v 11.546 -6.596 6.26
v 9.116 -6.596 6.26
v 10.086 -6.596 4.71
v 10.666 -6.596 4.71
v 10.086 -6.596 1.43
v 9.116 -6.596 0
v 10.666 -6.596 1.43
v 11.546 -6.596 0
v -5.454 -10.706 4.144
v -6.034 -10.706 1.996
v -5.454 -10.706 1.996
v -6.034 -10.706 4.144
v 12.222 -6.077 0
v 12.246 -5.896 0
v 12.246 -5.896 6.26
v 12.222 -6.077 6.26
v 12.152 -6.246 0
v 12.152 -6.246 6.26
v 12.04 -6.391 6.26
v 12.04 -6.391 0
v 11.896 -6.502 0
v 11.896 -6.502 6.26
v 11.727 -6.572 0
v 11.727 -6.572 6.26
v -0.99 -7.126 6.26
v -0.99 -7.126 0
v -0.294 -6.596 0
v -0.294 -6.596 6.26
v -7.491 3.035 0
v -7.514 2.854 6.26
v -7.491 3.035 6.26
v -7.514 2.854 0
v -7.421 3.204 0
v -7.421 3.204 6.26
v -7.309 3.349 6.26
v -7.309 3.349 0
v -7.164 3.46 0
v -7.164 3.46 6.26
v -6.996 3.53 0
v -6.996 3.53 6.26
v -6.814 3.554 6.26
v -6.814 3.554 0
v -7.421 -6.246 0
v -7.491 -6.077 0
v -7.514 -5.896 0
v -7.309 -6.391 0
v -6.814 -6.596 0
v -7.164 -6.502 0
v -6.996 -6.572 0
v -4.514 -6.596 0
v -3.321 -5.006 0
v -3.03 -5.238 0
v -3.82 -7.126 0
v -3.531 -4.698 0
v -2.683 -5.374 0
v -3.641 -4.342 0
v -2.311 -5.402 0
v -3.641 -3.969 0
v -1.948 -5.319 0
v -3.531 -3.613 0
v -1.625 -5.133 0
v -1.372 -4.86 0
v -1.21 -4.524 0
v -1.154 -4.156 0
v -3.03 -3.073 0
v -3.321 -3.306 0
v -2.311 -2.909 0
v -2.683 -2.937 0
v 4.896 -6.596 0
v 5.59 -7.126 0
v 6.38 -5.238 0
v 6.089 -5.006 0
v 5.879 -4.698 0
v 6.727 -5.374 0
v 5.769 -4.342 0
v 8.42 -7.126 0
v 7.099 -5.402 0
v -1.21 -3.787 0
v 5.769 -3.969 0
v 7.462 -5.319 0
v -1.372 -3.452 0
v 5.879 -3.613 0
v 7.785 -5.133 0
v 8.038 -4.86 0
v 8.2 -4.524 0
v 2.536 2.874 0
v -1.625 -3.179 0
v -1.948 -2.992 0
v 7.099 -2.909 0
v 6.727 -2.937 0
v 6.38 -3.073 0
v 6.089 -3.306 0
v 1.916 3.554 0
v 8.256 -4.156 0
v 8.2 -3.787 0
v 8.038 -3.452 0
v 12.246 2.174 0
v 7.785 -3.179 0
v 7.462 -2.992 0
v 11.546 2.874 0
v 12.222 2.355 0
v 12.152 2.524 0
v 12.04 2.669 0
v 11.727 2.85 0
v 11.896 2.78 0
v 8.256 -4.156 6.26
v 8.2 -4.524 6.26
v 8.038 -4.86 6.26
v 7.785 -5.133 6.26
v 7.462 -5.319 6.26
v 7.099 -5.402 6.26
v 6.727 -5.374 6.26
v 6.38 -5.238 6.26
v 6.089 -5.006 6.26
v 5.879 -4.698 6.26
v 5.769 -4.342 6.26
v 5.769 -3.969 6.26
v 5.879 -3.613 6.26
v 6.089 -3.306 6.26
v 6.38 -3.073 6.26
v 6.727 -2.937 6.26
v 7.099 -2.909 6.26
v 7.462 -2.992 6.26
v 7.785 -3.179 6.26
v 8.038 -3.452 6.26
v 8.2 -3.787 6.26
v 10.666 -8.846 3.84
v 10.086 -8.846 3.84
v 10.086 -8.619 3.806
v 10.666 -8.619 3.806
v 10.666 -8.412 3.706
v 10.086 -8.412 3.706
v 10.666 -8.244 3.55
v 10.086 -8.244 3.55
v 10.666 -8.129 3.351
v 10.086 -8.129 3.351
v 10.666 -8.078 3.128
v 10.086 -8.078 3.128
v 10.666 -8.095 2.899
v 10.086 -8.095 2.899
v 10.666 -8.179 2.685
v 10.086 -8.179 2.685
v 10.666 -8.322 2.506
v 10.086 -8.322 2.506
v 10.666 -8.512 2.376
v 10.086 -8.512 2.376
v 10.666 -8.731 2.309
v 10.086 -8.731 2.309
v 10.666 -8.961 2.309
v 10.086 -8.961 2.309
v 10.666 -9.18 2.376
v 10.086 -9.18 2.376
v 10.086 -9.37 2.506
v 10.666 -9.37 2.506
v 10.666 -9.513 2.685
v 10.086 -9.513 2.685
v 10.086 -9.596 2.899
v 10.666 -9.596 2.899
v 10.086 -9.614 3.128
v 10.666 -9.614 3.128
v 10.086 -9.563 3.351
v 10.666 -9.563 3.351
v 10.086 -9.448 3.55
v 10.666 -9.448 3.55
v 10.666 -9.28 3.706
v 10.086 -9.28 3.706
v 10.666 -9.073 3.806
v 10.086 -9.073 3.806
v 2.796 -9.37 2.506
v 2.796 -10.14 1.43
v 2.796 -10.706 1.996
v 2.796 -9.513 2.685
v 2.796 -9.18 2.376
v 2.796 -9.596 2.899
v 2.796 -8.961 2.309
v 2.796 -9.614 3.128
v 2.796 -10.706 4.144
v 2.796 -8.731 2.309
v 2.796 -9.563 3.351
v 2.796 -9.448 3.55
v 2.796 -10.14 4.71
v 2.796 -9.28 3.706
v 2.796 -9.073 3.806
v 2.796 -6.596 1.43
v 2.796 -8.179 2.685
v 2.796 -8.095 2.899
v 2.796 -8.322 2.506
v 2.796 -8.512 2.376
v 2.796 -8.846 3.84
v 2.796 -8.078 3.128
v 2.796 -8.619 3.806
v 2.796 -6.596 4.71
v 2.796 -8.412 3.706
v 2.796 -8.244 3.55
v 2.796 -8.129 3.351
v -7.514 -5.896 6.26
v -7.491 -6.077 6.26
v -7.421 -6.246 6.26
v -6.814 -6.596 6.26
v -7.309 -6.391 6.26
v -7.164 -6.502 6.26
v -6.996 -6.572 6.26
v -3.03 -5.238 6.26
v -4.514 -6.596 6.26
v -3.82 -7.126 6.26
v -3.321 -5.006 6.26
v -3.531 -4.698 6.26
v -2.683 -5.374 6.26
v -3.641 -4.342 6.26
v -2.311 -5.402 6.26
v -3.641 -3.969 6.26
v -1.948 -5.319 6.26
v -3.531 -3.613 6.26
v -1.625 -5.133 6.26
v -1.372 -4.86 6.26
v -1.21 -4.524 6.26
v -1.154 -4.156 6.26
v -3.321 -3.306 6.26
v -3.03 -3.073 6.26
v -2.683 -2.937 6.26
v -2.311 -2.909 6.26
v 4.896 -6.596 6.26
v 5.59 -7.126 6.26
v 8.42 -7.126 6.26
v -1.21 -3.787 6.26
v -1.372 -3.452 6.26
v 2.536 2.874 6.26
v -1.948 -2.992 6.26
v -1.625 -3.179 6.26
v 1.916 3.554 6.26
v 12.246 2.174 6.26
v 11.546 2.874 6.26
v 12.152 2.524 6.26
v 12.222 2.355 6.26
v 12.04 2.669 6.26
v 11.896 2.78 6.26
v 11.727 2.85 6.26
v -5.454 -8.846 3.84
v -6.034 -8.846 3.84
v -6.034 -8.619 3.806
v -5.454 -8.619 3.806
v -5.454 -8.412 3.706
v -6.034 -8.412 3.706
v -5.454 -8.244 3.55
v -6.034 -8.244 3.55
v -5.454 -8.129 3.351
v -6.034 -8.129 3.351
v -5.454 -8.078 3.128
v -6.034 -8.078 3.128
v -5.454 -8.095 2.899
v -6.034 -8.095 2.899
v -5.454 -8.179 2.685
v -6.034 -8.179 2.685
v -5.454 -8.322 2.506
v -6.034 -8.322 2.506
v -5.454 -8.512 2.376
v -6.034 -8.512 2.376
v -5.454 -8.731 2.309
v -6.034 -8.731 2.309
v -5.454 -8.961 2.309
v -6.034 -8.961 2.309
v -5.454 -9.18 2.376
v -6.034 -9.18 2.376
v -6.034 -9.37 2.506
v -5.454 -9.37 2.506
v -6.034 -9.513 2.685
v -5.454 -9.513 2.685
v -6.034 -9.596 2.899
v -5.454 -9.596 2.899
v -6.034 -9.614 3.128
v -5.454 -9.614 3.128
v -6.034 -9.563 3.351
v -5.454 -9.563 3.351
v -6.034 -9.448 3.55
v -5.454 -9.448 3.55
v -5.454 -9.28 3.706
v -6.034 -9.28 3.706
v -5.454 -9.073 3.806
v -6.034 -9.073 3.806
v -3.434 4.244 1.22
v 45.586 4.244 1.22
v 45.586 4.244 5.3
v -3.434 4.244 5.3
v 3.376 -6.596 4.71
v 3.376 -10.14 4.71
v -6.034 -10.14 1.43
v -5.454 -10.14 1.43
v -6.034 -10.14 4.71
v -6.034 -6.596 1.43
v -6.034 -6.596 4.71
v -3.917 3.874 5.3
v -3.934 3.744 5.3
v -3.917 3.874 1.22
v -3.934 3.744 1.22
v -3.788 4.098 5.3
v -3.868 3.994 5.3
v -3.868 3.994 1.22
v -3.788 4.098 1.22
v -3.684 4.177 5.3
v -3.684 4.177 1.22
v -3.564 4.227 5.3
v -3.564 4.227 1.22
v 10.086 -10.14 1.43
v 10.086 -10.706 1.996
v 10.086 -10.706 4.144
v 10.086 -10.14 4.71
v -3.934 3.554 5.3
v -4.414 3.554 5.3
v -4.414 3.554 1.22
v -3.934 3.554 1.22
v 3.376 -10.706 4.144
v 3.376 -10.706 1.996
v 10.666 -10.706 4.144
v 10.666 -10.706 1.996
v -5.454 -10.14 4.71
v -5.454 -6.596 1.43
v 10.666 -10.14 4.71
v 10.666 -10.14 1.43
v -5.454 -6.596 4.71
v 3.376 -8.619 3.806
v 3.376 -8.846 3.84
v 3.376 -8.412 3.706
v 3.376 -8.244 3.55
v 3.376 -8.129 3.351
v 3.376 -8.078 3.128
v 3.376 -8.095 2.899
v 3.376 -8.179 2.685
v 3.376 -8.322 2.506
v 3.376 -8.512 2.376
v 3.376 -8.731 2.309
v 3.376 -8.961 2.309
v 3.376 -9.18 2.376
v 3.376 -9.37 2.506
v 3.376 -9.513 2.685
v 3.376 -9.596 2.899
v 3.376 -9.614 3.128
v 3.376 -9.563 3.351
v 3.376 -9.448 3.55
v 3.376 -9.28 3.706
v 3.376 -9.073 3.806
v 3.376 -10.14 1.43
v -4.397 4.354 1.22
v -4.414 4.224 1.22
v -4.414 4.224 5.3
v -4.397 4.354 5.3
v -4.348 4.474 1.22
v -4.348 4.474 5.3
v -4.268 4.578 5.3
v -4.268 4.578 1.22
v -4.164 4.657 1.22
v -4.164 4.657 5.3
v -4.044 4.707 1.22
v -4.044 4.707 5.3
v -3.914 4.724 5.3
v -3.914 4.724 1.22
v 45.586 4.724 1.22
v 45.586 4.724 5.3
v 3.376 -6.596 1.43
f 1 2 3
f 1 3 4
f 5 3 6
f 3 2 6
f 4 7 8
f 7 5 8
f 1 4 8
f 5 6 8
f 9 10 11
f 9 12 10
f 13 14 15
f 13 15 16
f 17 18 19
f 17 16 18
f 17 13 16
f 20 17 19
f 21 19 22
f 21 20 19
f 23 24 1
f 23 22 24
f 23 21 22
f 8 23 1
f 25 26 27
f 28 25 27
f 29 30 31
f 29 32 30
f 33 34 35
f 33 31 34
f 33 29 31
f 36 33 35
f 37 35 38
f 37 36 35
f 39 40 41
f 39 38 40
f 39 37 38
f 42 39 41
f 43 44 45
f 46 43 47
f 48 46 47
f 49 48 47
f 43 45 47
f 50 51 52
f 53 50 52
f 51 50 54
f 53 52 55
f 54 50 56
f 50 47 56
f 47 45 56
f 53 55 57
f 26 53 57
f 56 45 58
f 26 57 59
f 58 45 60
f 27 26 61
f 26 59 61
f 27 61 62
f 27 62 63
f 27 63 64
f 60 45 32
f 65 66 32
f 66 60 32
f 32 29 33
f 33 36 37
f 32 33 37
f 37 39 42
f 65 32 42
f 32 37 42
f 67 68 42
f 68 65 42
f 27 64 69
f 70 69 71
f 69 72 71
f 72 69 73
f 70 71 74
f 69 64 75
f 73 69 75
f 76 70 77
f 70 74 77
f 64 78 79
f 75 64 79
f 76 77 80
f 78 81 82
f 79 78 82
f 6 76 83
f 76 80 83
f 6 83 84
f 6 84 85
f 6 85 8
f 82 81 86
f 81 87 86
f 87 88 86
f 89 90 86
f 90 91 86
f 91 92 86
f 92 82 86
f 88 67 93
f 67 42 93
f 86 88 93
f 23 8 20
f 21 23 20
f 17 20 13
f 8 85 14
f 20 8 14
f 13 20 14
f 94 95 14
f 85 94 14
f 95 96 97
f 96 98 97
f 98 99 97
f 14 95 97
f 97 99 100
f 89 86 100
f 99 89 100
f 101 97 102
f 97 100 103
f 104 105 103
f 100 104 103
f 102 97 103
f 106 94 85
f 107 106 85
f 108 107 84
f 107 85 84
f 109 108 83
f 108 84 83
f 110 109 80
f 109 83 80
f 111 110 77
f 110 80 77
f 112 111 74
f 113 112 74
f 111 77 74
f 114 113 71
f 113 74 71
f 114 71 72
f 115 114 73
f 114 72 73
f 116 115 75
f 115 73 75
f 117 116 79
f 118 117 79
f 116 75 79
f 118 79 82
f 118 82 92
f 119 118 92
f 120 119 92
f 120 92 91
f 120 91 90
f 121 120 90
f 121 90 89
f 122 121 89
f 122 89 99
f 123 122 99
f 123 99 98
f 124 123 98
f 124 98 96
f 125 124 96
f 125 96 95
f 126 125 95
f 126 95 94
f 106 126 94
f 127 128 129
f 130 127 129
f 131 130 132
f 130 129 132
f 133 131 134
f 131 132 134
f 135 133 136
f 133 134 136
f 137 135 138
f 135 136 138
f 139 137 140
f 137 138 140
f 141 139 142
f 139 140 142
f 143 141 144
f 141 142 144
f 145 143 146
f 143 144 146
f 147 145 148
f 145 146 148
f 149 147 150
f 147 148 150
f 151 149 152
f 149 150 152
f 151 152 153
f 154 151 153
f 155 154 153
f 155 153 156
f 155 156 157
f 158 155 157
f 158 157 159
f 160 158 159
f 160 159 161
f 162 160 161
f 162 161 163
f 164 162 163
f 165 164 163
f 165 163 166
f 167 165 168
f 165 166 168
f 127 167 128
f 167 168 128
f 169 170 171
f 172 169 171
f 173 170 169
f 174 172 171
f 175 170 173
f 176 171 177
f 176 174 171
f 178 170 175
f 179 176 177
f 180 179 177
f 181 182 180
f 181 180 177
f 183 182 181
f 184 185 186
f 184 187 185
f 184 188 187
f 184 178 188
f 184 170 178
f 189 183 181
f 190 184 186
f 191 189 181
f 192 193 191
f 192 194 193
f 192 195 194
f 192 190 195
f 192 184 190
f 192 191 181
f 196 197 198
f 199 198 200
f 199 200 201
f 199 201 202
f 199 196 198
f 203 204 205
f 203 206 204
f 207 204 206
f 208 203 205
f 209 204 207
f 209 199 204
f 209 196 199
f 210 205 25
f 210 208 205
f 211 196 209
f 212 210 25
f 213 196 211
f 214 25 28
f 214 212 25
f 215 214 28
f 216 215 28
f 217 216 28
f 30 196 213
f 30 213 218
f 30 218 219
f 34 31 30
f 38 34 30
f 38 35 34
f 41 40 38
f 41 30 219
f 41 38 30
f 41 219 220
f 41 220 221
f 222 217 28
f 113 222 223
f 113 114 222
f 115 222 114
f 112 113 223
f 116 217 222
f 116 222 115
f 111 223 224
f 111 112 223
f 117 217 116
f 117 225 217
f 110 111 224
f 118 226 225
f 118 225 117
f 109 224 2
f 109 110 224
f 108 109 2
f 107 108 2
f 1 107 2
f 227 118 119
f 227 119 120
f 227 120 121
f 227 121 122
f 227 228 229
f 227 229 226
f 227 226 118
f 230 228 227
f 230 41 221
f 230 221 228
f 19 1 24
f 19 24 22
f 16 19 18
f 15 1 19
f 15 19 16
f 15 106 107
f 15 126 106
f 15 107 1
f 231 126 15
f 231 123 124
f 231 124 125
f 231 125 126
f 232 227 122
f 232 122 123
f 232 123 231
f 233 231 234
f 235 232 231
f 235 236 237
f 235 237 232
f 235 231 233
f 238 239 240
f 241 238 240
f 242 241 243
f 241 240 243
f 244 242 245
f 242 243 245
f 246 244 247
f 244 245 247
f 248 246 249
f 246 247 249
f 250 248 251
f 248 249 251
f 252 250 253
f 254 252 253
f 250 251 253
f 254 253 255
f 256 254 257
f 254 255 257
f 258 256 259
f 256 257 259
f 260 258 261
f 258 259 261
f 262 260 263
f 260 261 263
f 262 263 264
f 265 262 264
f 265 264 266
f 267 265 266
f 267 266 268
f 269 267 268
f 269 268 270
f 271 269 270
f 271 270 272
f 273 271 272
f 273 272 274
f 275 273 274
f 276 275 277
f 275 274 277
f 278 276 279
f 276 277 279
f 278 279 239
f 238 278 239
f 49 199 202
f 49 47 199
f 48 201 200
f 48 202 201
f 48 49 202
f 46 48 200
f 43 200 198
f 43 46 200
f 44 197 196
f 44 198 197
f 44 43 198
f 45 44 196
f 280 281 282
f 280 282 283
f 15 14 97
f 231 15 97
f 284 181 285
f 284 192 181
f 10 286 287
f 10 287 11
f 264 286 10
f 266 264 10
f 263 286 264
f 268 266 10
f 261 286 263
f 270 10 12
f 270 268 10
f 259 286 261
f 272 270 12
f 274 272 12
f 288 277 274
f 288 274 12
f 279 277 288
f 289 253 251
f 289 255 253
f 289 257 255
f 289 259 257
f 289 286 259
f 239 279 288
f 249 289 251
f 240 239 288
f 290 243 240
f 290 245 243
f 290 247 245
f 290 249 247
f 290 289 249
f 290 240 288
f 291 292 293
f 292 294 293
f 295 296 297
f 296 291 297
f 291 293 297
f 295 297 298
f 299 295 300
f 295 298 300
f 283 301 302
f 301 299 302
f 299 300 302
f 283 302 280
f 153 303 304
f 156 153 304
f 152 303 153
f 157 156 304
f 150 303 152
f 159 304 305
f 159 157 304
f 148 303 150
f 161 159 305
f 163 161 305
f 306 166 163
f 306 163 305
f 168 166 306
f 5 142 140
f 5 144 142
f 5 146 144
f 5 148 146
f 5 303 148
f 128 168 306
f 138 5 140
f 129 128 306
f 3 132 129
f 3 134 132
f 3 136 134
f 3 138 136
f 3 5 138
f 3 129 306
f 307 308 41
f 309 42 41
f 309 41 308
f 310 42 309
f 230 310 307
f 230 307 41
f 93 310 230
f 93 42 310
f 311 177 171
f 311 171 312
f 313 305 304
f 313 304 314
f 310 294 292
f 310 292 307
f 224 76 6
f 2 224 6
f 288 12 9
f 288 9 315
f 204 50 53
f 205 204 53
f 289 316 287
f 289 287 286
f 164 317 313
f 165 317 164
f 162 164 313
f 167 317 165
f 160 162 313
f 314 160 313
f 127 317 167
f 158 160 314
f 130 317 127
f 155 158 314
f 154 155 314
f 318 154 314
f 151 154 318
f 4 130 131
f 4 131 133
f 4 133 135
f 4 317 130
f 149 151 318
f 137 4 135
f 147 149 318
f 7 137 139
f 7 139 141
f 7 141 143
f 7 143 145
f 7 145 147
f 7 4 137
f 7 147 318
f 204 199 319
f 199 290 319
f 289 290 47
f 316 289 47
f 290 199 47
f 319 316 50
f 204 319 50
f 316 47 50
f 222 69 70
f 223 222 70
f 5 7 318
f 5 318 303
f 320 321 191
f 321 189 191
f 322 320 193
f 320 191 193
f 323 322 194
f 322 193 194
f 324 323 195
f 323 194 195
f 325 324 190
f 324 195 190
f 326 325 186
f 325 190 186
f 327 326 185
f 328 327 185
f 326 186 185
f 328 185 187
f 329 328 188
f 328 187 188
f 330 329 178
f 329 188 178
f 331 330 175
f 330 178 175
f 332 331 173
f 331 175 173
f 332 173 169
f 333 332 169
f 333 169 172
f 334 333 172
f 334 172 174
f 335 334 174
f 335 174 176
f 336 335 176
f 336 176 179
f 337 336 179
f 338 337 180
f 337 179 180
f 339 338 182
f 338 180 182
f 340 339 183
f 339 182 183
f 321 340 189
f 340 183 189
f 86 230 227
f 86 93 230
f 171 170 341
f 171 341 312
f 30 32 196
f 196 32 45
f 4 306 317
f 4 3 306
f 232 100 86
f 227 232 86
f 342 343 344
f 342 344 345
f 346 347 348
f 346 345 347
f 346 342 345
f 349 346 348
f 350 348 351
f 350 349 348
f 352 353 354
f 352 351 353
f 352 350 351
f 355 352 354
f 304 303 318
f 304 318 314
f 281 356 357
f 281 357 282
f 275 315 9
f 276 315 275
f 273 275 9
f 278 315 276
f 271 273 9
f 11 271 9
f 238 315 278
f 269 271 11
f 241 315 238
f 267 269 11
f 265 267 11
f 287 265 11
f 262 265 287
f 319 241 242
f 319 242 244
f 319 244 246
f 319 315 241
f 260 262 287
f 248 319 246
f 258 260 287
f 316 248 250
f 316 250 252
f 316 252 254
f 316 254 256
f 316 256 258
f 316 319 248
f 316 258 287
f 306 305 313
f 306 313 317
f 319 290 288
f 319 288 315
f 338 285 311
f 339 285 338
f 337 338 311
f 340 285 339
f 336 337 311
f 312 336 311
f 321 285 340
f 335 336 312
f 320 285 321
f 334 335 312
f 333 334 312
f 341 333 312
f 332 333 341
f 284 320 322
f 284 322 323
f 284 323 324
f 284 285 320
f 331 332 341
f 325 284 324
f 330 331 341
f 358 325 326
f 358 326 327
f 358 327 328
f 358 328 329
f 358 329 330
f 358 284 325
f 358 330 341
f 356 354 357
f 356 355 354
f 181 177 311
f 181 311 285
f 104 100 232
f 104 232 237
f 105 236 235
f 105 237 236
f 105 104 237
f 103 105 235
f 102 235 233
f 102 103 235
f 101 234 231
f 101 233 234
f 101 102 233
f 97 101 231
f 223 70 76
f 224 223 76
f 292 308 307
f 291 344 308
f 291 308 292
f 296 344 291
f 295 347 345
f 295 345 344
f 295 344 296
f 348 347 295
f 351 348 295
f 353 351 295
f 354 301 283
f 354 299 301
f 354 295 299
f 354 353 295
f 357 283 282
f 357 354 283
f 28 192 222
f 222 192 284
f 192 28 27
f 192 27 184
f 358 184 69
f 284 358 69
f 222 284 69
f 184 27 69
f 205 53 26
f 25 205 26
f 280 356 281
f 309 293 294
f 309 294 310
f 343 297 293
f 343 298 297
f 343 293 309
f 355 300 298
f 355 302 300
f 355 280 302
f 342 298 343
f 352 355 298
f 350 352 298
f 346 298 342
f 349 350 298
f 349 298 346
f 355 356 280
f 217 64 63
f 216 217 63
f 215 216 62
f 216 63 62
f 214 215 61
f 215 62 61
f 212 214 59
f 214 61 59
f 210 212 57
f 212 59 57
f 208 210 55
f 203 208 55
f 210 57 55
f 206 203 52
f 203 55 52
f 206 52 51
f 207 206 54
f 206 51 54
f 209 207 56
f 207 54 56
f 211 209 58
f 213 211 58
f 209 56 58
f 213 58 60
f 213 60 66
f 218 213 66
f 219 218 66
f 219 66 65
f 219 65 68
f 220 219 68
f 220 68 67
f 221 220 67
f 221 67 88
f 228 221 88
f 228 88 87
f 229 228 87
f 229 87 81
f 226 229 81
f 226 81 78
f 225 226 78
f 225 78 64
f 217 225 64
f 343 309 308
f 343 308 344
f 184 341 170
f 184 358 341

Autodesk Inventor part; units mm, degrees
ref_plane "YZ Plane" through (0, 0, 0) normal (1, 0, 0) x (0, 1, 0)
ref_plane "XZ Plane" through (0, 0, 0) normal (0, 1, 0) x (-1, 0, 0)
ref_plane "XY Plane" through (0, 0, 0) normal (0, 0, 1) x (1, 0, 0)
sketch "Sketch1" plane through (0, 0, 0) normal (0, 0, 1) x (1, 0, 0)
  line L0 (-6.8145, -6.5958) -> (-4.5145, -6.5958)
  line L1 (-4.5145, -6.5958) -> (-3.8195, -7.1258)
  line L2 (-3.8195, -7.1258) -> (-0.9895, -7.1258)
  line L3 (-0.9895, -7.1258) -> (-0.2945, -6.5958)
  line L4 (-0.2945, -6.5958) -> (4.8955, -6.5958)
  line L5 (4.8955, -6.5958) -> (5.5905, -7.1258)
  line L6 (5.5905, -7.1258) -> (8.4205, -7.1258)
  line L7 (8.4205, -7.1258) -> (9.1155, -6.5958)
  line L8 (9.1155, -6.5958) -> (11.5455, -6.5958)
  line L9 (12.2455, -5.8958) -> (12.2455, 2.1742)
  line L10 (11.5455, 2.8742) -> (2.5355, 2.8742)
  line L11 (-7.5145, 2.8542) -> (-7.5145, -5.8958)
  line L12 (-2.4045, -0.6574) -> (-2.4045, -6.9746)
  line L13 (7.0055, -0.6574) -> (7.0055, -6.9746)
  line L14 (-8.0311, -4.1558) -> (13.5632, -4.1558)
  circle A0 centre (-2.4045, -4.1558) radius 1.25
  circle A1 centre (7.0055, -4.1558) radius 1.25
  line L15 (1.9155, 3.5542) -> (2.5355, 2.8742)
  line L16 (-4.4145, 3.5542) -> (-4.4145, 4.2242)
  line L17 (-3.9145, 4.7242) -> (45.5855, 4.7242)
  line L18 (45.5855, 4.7242) -> (45.5855, 4.2442)
  line L19 (45.5855, 4.2442) -> (-3.4345, 4.2442)
  line L20 (-3.9345, 3.7442) -> (-3.9345, 3.5542)
  line L21 (-6.8145, 3.5542) -> (-4.4145, 3.5542)
  line L22 (-3.9345, 3.5542) -> (1.9155, 3.5542)
  arc A2 (-6.8145, 3.5542) -> (-7.5145, 2.8542) centre (-6.8145, 2.8542) ccw
  arc A3 (-7.5145, -5.8958) -> (-6.8145, -6.5958) centre (-6.8145, -5.8958) ccw
  arc A4 (11.5455, -6.5958) -> (12.2455, -5.8958) centre (11.5455, -5.8958) ccw
  arc A5 (12.2455, 2.1742) -> (11.5455, 2.8742) centre (11.5455, 2.1742) ccw
  arc A6 (-3.9145, 4.7242) -> (-4.4145, 4.2242) centre (-3.9145, 4.2242) ccw
  arc A7 (-3.4345, 4.2442) -> (-3.9345, 3.7442) centre (-3.4345, 3.7442) ccw
  point P0 (-7.5145, -6.5958)
  point P1 (12.2455, 2.8742)
  point P2 (-7.5145, 3.5542)
  point P3 (-4.4145, 4.7242)
  dimension "d21" = 2.5
  dimension "d22" = 2.5
  dimension "d23" = 2.97
  dimension "d24" = 0.53
  dimension "d25" = 2.83
  dimension "d26" = 3
  dimension "d27" = 5.11
  dimension "d28" = 9.41
  dimension "d29" = 19.76
  dimension "d31" = 9.47
  dimension "d32" = 9.71
  dimension "d33" = 9.43
  dimension "d40" = 10.15
  dimension "d41" = 3.1
  dimension "d42" = 0.48
  dimension "d43" = 0.48
  dimension "d44" = 1.17
  dimension "d45" = 50
  dimension "d46" = 0.7
  dimension "d47" = 0.5
extrude "Extrusion1" add sketch "Sketch1" along normal blind 6.26 contours A3 L11 L14 A0 A1 L9 A4 L8 L7 L6 L5 L4 L3 L2 L1 L0 | L11 A2 L21 L16 A6 L17 L18 L19 A7 L20 L22 L15 L10 A5 L9 L14 A1 A0
sketch "Sketch2" plane through (0, 0, 6.26) normal (0, 0, 1) x (1, 0, 0)
  line L0 (-3.9345, 3.5542) -> (-3.9345, 3.7442) projected
  arc A0 (-3.4345, 4.2442) -> (-3.9345, 3.7442) centre (-3.4345, 3.7442) ccw projected
  line L1 (-3.4345, 4.2442) -> (45.5855, 4.2442) projected
  line L2 (45.5855, 4.2442) -> (45.5855, 4.7242) projected
  line L3 (45.5855, 4.7242) -> (-3.9145, 4.7242) projected
  arc A1 (-3.9145, 4.7242) -> (-4.4145, 4.2242) centre (-3.9145, 4.2242) ccw projected
  line L4 (-4.4145, 4.2242) -> (-4.4145, 3.5542) projected
  line L5 (-7.5145, 2.8542) -> (-7.5145, -5.8958) projected
  line L6 (-4.4145, 3.5542) -> (-3.9345, 3.5542)
  point P0 (0, 0)
extrude "Extrusion2" cut sketch "Sketch2" against normal blind 0.96
sketch "Sketch3" plane through (0, 0, 0) normal (0, 0, -1) x (-1, 0, 0)
  line L0 (4.4145, 3.5542) -> (4.4145, 4.2242) projected
  arc A0 (4.4145, 4.2242) -> (3.9145, 4.7242) centre (3.9145, 4.2242) ccw projected
  line L1 (3.9145, 4.7242) -> (-45.5855, 4.7242) projected
  line L2 (-45.5855, 4.7242) -> (-45.5855, 4.2442) projected
  line L3 (-45.5855, 4.2442) -> (3.4345, 4.2442) projected
  arc A1 (3.9345, 3.7442) -> (3.4345, 4.2442) centre (3.4345, 3.7442) ccw projected
  line L4 (3.9345, 3.7442) -> (3.9345, 3.5542) projected
  line L5 (0.9895, -7.1258) -> (3.8195, -7.1258) projected
  line L6 (3.9345, 3.5542) -> (4.4145, 3.5542)
  point P0 (0, 0)
extrude "Extrusion3" cut sketch "Sketch3" against normal blind 1.22
sketch "Sketch4" plane through (-0.2945, -6.5958, 0) normal (0, -1, 0) x (1, 0, 0)
  line L0 (3.09, 4.71) -> (3.67, 4.71)
  line L1 (3.67, 4.71) -> (3.67, 1.43)
  line L2 (3.67, 1.43) -> (3.09, 1.43)
  line L3 (3.09, 1.43) -> (3.09, 4.71)
  line L4 (-5.74, 4.71) -> (-5.16, 4.71)
  line L5 (-5.16, 4.71) -> (-5.16, 1.43)
  line L6 (-5.16, 1.43) -> (-5.74, 1.43)
  line L7 (-5.74, 1.43) -> (-5.74, 4.71)
  line L8 (10.38, 4.71) -> (10.96, 4.71)
  line L9 (10.96, 4.71) -> (10.96, 1.43)
  line L10 (10.96, 1.43) -> (10.38, 1.43)
  line L11 (10.38, 1.43) -> (10.38, 4.71)
  line L12 (-6.52, 6.26) -> (-4.22, 6.26) projected
  line L13 (-7.22, 0) -> (-7.22, 6.26) projected
  point P0 (0.2945, 0)
  dimension "d52" = 3.28
  dimension "d54" = 0.58
  dimension "d55" = 1.55
  dimension "d56" = 1.48
  dimension "d57" = 9.41
  dimension "d58" = 7.87
extrude "Extrusion4" add sketch "Sketch4" along normal blind 4.11
sketch "Sketch5" plane through (-6.0345, -10.7058, 1.43) normal (-1, 0, 0) x (0, 0, 1)
  line L0 (0, 4.11) -> (0, 0) projected
  line L1 (3.28, 0) -> (0, 0) projected
  line L2 (3.28, 4.11) -> (3.28, 0) projected
  circle A0 centre (1.64, 1.86) radius 0.77
  line L3 (0, 0.5657) -> (0.5657, 0)
  line L4 (0, 0.5657) -> (0.8, 0.5657) construction
  line L5 (2.7143, 0) -> (3.28, 0.5657)
  point P0 (-1.43, 10.7058)
  dimension "d61" = 1.54
  dimension "d62" = 1.86
  dimension "d63" = 3.28
  dimension "d64" = 1.64
  dimension "d65" = 45
  dimension "d66" = 0.8
extrude "Extrusion5" cut sketch "Sketch5" against normal through all
equation "\"d22\" = d21"
equation "\"d43\" = d42"
equation "\"d64\" = 0.5 * d63"
equation "\"d7\" = d6"
equation "\"d6\" = 2.9"
properties part number "switch" material "Acetal Resin, Black"
